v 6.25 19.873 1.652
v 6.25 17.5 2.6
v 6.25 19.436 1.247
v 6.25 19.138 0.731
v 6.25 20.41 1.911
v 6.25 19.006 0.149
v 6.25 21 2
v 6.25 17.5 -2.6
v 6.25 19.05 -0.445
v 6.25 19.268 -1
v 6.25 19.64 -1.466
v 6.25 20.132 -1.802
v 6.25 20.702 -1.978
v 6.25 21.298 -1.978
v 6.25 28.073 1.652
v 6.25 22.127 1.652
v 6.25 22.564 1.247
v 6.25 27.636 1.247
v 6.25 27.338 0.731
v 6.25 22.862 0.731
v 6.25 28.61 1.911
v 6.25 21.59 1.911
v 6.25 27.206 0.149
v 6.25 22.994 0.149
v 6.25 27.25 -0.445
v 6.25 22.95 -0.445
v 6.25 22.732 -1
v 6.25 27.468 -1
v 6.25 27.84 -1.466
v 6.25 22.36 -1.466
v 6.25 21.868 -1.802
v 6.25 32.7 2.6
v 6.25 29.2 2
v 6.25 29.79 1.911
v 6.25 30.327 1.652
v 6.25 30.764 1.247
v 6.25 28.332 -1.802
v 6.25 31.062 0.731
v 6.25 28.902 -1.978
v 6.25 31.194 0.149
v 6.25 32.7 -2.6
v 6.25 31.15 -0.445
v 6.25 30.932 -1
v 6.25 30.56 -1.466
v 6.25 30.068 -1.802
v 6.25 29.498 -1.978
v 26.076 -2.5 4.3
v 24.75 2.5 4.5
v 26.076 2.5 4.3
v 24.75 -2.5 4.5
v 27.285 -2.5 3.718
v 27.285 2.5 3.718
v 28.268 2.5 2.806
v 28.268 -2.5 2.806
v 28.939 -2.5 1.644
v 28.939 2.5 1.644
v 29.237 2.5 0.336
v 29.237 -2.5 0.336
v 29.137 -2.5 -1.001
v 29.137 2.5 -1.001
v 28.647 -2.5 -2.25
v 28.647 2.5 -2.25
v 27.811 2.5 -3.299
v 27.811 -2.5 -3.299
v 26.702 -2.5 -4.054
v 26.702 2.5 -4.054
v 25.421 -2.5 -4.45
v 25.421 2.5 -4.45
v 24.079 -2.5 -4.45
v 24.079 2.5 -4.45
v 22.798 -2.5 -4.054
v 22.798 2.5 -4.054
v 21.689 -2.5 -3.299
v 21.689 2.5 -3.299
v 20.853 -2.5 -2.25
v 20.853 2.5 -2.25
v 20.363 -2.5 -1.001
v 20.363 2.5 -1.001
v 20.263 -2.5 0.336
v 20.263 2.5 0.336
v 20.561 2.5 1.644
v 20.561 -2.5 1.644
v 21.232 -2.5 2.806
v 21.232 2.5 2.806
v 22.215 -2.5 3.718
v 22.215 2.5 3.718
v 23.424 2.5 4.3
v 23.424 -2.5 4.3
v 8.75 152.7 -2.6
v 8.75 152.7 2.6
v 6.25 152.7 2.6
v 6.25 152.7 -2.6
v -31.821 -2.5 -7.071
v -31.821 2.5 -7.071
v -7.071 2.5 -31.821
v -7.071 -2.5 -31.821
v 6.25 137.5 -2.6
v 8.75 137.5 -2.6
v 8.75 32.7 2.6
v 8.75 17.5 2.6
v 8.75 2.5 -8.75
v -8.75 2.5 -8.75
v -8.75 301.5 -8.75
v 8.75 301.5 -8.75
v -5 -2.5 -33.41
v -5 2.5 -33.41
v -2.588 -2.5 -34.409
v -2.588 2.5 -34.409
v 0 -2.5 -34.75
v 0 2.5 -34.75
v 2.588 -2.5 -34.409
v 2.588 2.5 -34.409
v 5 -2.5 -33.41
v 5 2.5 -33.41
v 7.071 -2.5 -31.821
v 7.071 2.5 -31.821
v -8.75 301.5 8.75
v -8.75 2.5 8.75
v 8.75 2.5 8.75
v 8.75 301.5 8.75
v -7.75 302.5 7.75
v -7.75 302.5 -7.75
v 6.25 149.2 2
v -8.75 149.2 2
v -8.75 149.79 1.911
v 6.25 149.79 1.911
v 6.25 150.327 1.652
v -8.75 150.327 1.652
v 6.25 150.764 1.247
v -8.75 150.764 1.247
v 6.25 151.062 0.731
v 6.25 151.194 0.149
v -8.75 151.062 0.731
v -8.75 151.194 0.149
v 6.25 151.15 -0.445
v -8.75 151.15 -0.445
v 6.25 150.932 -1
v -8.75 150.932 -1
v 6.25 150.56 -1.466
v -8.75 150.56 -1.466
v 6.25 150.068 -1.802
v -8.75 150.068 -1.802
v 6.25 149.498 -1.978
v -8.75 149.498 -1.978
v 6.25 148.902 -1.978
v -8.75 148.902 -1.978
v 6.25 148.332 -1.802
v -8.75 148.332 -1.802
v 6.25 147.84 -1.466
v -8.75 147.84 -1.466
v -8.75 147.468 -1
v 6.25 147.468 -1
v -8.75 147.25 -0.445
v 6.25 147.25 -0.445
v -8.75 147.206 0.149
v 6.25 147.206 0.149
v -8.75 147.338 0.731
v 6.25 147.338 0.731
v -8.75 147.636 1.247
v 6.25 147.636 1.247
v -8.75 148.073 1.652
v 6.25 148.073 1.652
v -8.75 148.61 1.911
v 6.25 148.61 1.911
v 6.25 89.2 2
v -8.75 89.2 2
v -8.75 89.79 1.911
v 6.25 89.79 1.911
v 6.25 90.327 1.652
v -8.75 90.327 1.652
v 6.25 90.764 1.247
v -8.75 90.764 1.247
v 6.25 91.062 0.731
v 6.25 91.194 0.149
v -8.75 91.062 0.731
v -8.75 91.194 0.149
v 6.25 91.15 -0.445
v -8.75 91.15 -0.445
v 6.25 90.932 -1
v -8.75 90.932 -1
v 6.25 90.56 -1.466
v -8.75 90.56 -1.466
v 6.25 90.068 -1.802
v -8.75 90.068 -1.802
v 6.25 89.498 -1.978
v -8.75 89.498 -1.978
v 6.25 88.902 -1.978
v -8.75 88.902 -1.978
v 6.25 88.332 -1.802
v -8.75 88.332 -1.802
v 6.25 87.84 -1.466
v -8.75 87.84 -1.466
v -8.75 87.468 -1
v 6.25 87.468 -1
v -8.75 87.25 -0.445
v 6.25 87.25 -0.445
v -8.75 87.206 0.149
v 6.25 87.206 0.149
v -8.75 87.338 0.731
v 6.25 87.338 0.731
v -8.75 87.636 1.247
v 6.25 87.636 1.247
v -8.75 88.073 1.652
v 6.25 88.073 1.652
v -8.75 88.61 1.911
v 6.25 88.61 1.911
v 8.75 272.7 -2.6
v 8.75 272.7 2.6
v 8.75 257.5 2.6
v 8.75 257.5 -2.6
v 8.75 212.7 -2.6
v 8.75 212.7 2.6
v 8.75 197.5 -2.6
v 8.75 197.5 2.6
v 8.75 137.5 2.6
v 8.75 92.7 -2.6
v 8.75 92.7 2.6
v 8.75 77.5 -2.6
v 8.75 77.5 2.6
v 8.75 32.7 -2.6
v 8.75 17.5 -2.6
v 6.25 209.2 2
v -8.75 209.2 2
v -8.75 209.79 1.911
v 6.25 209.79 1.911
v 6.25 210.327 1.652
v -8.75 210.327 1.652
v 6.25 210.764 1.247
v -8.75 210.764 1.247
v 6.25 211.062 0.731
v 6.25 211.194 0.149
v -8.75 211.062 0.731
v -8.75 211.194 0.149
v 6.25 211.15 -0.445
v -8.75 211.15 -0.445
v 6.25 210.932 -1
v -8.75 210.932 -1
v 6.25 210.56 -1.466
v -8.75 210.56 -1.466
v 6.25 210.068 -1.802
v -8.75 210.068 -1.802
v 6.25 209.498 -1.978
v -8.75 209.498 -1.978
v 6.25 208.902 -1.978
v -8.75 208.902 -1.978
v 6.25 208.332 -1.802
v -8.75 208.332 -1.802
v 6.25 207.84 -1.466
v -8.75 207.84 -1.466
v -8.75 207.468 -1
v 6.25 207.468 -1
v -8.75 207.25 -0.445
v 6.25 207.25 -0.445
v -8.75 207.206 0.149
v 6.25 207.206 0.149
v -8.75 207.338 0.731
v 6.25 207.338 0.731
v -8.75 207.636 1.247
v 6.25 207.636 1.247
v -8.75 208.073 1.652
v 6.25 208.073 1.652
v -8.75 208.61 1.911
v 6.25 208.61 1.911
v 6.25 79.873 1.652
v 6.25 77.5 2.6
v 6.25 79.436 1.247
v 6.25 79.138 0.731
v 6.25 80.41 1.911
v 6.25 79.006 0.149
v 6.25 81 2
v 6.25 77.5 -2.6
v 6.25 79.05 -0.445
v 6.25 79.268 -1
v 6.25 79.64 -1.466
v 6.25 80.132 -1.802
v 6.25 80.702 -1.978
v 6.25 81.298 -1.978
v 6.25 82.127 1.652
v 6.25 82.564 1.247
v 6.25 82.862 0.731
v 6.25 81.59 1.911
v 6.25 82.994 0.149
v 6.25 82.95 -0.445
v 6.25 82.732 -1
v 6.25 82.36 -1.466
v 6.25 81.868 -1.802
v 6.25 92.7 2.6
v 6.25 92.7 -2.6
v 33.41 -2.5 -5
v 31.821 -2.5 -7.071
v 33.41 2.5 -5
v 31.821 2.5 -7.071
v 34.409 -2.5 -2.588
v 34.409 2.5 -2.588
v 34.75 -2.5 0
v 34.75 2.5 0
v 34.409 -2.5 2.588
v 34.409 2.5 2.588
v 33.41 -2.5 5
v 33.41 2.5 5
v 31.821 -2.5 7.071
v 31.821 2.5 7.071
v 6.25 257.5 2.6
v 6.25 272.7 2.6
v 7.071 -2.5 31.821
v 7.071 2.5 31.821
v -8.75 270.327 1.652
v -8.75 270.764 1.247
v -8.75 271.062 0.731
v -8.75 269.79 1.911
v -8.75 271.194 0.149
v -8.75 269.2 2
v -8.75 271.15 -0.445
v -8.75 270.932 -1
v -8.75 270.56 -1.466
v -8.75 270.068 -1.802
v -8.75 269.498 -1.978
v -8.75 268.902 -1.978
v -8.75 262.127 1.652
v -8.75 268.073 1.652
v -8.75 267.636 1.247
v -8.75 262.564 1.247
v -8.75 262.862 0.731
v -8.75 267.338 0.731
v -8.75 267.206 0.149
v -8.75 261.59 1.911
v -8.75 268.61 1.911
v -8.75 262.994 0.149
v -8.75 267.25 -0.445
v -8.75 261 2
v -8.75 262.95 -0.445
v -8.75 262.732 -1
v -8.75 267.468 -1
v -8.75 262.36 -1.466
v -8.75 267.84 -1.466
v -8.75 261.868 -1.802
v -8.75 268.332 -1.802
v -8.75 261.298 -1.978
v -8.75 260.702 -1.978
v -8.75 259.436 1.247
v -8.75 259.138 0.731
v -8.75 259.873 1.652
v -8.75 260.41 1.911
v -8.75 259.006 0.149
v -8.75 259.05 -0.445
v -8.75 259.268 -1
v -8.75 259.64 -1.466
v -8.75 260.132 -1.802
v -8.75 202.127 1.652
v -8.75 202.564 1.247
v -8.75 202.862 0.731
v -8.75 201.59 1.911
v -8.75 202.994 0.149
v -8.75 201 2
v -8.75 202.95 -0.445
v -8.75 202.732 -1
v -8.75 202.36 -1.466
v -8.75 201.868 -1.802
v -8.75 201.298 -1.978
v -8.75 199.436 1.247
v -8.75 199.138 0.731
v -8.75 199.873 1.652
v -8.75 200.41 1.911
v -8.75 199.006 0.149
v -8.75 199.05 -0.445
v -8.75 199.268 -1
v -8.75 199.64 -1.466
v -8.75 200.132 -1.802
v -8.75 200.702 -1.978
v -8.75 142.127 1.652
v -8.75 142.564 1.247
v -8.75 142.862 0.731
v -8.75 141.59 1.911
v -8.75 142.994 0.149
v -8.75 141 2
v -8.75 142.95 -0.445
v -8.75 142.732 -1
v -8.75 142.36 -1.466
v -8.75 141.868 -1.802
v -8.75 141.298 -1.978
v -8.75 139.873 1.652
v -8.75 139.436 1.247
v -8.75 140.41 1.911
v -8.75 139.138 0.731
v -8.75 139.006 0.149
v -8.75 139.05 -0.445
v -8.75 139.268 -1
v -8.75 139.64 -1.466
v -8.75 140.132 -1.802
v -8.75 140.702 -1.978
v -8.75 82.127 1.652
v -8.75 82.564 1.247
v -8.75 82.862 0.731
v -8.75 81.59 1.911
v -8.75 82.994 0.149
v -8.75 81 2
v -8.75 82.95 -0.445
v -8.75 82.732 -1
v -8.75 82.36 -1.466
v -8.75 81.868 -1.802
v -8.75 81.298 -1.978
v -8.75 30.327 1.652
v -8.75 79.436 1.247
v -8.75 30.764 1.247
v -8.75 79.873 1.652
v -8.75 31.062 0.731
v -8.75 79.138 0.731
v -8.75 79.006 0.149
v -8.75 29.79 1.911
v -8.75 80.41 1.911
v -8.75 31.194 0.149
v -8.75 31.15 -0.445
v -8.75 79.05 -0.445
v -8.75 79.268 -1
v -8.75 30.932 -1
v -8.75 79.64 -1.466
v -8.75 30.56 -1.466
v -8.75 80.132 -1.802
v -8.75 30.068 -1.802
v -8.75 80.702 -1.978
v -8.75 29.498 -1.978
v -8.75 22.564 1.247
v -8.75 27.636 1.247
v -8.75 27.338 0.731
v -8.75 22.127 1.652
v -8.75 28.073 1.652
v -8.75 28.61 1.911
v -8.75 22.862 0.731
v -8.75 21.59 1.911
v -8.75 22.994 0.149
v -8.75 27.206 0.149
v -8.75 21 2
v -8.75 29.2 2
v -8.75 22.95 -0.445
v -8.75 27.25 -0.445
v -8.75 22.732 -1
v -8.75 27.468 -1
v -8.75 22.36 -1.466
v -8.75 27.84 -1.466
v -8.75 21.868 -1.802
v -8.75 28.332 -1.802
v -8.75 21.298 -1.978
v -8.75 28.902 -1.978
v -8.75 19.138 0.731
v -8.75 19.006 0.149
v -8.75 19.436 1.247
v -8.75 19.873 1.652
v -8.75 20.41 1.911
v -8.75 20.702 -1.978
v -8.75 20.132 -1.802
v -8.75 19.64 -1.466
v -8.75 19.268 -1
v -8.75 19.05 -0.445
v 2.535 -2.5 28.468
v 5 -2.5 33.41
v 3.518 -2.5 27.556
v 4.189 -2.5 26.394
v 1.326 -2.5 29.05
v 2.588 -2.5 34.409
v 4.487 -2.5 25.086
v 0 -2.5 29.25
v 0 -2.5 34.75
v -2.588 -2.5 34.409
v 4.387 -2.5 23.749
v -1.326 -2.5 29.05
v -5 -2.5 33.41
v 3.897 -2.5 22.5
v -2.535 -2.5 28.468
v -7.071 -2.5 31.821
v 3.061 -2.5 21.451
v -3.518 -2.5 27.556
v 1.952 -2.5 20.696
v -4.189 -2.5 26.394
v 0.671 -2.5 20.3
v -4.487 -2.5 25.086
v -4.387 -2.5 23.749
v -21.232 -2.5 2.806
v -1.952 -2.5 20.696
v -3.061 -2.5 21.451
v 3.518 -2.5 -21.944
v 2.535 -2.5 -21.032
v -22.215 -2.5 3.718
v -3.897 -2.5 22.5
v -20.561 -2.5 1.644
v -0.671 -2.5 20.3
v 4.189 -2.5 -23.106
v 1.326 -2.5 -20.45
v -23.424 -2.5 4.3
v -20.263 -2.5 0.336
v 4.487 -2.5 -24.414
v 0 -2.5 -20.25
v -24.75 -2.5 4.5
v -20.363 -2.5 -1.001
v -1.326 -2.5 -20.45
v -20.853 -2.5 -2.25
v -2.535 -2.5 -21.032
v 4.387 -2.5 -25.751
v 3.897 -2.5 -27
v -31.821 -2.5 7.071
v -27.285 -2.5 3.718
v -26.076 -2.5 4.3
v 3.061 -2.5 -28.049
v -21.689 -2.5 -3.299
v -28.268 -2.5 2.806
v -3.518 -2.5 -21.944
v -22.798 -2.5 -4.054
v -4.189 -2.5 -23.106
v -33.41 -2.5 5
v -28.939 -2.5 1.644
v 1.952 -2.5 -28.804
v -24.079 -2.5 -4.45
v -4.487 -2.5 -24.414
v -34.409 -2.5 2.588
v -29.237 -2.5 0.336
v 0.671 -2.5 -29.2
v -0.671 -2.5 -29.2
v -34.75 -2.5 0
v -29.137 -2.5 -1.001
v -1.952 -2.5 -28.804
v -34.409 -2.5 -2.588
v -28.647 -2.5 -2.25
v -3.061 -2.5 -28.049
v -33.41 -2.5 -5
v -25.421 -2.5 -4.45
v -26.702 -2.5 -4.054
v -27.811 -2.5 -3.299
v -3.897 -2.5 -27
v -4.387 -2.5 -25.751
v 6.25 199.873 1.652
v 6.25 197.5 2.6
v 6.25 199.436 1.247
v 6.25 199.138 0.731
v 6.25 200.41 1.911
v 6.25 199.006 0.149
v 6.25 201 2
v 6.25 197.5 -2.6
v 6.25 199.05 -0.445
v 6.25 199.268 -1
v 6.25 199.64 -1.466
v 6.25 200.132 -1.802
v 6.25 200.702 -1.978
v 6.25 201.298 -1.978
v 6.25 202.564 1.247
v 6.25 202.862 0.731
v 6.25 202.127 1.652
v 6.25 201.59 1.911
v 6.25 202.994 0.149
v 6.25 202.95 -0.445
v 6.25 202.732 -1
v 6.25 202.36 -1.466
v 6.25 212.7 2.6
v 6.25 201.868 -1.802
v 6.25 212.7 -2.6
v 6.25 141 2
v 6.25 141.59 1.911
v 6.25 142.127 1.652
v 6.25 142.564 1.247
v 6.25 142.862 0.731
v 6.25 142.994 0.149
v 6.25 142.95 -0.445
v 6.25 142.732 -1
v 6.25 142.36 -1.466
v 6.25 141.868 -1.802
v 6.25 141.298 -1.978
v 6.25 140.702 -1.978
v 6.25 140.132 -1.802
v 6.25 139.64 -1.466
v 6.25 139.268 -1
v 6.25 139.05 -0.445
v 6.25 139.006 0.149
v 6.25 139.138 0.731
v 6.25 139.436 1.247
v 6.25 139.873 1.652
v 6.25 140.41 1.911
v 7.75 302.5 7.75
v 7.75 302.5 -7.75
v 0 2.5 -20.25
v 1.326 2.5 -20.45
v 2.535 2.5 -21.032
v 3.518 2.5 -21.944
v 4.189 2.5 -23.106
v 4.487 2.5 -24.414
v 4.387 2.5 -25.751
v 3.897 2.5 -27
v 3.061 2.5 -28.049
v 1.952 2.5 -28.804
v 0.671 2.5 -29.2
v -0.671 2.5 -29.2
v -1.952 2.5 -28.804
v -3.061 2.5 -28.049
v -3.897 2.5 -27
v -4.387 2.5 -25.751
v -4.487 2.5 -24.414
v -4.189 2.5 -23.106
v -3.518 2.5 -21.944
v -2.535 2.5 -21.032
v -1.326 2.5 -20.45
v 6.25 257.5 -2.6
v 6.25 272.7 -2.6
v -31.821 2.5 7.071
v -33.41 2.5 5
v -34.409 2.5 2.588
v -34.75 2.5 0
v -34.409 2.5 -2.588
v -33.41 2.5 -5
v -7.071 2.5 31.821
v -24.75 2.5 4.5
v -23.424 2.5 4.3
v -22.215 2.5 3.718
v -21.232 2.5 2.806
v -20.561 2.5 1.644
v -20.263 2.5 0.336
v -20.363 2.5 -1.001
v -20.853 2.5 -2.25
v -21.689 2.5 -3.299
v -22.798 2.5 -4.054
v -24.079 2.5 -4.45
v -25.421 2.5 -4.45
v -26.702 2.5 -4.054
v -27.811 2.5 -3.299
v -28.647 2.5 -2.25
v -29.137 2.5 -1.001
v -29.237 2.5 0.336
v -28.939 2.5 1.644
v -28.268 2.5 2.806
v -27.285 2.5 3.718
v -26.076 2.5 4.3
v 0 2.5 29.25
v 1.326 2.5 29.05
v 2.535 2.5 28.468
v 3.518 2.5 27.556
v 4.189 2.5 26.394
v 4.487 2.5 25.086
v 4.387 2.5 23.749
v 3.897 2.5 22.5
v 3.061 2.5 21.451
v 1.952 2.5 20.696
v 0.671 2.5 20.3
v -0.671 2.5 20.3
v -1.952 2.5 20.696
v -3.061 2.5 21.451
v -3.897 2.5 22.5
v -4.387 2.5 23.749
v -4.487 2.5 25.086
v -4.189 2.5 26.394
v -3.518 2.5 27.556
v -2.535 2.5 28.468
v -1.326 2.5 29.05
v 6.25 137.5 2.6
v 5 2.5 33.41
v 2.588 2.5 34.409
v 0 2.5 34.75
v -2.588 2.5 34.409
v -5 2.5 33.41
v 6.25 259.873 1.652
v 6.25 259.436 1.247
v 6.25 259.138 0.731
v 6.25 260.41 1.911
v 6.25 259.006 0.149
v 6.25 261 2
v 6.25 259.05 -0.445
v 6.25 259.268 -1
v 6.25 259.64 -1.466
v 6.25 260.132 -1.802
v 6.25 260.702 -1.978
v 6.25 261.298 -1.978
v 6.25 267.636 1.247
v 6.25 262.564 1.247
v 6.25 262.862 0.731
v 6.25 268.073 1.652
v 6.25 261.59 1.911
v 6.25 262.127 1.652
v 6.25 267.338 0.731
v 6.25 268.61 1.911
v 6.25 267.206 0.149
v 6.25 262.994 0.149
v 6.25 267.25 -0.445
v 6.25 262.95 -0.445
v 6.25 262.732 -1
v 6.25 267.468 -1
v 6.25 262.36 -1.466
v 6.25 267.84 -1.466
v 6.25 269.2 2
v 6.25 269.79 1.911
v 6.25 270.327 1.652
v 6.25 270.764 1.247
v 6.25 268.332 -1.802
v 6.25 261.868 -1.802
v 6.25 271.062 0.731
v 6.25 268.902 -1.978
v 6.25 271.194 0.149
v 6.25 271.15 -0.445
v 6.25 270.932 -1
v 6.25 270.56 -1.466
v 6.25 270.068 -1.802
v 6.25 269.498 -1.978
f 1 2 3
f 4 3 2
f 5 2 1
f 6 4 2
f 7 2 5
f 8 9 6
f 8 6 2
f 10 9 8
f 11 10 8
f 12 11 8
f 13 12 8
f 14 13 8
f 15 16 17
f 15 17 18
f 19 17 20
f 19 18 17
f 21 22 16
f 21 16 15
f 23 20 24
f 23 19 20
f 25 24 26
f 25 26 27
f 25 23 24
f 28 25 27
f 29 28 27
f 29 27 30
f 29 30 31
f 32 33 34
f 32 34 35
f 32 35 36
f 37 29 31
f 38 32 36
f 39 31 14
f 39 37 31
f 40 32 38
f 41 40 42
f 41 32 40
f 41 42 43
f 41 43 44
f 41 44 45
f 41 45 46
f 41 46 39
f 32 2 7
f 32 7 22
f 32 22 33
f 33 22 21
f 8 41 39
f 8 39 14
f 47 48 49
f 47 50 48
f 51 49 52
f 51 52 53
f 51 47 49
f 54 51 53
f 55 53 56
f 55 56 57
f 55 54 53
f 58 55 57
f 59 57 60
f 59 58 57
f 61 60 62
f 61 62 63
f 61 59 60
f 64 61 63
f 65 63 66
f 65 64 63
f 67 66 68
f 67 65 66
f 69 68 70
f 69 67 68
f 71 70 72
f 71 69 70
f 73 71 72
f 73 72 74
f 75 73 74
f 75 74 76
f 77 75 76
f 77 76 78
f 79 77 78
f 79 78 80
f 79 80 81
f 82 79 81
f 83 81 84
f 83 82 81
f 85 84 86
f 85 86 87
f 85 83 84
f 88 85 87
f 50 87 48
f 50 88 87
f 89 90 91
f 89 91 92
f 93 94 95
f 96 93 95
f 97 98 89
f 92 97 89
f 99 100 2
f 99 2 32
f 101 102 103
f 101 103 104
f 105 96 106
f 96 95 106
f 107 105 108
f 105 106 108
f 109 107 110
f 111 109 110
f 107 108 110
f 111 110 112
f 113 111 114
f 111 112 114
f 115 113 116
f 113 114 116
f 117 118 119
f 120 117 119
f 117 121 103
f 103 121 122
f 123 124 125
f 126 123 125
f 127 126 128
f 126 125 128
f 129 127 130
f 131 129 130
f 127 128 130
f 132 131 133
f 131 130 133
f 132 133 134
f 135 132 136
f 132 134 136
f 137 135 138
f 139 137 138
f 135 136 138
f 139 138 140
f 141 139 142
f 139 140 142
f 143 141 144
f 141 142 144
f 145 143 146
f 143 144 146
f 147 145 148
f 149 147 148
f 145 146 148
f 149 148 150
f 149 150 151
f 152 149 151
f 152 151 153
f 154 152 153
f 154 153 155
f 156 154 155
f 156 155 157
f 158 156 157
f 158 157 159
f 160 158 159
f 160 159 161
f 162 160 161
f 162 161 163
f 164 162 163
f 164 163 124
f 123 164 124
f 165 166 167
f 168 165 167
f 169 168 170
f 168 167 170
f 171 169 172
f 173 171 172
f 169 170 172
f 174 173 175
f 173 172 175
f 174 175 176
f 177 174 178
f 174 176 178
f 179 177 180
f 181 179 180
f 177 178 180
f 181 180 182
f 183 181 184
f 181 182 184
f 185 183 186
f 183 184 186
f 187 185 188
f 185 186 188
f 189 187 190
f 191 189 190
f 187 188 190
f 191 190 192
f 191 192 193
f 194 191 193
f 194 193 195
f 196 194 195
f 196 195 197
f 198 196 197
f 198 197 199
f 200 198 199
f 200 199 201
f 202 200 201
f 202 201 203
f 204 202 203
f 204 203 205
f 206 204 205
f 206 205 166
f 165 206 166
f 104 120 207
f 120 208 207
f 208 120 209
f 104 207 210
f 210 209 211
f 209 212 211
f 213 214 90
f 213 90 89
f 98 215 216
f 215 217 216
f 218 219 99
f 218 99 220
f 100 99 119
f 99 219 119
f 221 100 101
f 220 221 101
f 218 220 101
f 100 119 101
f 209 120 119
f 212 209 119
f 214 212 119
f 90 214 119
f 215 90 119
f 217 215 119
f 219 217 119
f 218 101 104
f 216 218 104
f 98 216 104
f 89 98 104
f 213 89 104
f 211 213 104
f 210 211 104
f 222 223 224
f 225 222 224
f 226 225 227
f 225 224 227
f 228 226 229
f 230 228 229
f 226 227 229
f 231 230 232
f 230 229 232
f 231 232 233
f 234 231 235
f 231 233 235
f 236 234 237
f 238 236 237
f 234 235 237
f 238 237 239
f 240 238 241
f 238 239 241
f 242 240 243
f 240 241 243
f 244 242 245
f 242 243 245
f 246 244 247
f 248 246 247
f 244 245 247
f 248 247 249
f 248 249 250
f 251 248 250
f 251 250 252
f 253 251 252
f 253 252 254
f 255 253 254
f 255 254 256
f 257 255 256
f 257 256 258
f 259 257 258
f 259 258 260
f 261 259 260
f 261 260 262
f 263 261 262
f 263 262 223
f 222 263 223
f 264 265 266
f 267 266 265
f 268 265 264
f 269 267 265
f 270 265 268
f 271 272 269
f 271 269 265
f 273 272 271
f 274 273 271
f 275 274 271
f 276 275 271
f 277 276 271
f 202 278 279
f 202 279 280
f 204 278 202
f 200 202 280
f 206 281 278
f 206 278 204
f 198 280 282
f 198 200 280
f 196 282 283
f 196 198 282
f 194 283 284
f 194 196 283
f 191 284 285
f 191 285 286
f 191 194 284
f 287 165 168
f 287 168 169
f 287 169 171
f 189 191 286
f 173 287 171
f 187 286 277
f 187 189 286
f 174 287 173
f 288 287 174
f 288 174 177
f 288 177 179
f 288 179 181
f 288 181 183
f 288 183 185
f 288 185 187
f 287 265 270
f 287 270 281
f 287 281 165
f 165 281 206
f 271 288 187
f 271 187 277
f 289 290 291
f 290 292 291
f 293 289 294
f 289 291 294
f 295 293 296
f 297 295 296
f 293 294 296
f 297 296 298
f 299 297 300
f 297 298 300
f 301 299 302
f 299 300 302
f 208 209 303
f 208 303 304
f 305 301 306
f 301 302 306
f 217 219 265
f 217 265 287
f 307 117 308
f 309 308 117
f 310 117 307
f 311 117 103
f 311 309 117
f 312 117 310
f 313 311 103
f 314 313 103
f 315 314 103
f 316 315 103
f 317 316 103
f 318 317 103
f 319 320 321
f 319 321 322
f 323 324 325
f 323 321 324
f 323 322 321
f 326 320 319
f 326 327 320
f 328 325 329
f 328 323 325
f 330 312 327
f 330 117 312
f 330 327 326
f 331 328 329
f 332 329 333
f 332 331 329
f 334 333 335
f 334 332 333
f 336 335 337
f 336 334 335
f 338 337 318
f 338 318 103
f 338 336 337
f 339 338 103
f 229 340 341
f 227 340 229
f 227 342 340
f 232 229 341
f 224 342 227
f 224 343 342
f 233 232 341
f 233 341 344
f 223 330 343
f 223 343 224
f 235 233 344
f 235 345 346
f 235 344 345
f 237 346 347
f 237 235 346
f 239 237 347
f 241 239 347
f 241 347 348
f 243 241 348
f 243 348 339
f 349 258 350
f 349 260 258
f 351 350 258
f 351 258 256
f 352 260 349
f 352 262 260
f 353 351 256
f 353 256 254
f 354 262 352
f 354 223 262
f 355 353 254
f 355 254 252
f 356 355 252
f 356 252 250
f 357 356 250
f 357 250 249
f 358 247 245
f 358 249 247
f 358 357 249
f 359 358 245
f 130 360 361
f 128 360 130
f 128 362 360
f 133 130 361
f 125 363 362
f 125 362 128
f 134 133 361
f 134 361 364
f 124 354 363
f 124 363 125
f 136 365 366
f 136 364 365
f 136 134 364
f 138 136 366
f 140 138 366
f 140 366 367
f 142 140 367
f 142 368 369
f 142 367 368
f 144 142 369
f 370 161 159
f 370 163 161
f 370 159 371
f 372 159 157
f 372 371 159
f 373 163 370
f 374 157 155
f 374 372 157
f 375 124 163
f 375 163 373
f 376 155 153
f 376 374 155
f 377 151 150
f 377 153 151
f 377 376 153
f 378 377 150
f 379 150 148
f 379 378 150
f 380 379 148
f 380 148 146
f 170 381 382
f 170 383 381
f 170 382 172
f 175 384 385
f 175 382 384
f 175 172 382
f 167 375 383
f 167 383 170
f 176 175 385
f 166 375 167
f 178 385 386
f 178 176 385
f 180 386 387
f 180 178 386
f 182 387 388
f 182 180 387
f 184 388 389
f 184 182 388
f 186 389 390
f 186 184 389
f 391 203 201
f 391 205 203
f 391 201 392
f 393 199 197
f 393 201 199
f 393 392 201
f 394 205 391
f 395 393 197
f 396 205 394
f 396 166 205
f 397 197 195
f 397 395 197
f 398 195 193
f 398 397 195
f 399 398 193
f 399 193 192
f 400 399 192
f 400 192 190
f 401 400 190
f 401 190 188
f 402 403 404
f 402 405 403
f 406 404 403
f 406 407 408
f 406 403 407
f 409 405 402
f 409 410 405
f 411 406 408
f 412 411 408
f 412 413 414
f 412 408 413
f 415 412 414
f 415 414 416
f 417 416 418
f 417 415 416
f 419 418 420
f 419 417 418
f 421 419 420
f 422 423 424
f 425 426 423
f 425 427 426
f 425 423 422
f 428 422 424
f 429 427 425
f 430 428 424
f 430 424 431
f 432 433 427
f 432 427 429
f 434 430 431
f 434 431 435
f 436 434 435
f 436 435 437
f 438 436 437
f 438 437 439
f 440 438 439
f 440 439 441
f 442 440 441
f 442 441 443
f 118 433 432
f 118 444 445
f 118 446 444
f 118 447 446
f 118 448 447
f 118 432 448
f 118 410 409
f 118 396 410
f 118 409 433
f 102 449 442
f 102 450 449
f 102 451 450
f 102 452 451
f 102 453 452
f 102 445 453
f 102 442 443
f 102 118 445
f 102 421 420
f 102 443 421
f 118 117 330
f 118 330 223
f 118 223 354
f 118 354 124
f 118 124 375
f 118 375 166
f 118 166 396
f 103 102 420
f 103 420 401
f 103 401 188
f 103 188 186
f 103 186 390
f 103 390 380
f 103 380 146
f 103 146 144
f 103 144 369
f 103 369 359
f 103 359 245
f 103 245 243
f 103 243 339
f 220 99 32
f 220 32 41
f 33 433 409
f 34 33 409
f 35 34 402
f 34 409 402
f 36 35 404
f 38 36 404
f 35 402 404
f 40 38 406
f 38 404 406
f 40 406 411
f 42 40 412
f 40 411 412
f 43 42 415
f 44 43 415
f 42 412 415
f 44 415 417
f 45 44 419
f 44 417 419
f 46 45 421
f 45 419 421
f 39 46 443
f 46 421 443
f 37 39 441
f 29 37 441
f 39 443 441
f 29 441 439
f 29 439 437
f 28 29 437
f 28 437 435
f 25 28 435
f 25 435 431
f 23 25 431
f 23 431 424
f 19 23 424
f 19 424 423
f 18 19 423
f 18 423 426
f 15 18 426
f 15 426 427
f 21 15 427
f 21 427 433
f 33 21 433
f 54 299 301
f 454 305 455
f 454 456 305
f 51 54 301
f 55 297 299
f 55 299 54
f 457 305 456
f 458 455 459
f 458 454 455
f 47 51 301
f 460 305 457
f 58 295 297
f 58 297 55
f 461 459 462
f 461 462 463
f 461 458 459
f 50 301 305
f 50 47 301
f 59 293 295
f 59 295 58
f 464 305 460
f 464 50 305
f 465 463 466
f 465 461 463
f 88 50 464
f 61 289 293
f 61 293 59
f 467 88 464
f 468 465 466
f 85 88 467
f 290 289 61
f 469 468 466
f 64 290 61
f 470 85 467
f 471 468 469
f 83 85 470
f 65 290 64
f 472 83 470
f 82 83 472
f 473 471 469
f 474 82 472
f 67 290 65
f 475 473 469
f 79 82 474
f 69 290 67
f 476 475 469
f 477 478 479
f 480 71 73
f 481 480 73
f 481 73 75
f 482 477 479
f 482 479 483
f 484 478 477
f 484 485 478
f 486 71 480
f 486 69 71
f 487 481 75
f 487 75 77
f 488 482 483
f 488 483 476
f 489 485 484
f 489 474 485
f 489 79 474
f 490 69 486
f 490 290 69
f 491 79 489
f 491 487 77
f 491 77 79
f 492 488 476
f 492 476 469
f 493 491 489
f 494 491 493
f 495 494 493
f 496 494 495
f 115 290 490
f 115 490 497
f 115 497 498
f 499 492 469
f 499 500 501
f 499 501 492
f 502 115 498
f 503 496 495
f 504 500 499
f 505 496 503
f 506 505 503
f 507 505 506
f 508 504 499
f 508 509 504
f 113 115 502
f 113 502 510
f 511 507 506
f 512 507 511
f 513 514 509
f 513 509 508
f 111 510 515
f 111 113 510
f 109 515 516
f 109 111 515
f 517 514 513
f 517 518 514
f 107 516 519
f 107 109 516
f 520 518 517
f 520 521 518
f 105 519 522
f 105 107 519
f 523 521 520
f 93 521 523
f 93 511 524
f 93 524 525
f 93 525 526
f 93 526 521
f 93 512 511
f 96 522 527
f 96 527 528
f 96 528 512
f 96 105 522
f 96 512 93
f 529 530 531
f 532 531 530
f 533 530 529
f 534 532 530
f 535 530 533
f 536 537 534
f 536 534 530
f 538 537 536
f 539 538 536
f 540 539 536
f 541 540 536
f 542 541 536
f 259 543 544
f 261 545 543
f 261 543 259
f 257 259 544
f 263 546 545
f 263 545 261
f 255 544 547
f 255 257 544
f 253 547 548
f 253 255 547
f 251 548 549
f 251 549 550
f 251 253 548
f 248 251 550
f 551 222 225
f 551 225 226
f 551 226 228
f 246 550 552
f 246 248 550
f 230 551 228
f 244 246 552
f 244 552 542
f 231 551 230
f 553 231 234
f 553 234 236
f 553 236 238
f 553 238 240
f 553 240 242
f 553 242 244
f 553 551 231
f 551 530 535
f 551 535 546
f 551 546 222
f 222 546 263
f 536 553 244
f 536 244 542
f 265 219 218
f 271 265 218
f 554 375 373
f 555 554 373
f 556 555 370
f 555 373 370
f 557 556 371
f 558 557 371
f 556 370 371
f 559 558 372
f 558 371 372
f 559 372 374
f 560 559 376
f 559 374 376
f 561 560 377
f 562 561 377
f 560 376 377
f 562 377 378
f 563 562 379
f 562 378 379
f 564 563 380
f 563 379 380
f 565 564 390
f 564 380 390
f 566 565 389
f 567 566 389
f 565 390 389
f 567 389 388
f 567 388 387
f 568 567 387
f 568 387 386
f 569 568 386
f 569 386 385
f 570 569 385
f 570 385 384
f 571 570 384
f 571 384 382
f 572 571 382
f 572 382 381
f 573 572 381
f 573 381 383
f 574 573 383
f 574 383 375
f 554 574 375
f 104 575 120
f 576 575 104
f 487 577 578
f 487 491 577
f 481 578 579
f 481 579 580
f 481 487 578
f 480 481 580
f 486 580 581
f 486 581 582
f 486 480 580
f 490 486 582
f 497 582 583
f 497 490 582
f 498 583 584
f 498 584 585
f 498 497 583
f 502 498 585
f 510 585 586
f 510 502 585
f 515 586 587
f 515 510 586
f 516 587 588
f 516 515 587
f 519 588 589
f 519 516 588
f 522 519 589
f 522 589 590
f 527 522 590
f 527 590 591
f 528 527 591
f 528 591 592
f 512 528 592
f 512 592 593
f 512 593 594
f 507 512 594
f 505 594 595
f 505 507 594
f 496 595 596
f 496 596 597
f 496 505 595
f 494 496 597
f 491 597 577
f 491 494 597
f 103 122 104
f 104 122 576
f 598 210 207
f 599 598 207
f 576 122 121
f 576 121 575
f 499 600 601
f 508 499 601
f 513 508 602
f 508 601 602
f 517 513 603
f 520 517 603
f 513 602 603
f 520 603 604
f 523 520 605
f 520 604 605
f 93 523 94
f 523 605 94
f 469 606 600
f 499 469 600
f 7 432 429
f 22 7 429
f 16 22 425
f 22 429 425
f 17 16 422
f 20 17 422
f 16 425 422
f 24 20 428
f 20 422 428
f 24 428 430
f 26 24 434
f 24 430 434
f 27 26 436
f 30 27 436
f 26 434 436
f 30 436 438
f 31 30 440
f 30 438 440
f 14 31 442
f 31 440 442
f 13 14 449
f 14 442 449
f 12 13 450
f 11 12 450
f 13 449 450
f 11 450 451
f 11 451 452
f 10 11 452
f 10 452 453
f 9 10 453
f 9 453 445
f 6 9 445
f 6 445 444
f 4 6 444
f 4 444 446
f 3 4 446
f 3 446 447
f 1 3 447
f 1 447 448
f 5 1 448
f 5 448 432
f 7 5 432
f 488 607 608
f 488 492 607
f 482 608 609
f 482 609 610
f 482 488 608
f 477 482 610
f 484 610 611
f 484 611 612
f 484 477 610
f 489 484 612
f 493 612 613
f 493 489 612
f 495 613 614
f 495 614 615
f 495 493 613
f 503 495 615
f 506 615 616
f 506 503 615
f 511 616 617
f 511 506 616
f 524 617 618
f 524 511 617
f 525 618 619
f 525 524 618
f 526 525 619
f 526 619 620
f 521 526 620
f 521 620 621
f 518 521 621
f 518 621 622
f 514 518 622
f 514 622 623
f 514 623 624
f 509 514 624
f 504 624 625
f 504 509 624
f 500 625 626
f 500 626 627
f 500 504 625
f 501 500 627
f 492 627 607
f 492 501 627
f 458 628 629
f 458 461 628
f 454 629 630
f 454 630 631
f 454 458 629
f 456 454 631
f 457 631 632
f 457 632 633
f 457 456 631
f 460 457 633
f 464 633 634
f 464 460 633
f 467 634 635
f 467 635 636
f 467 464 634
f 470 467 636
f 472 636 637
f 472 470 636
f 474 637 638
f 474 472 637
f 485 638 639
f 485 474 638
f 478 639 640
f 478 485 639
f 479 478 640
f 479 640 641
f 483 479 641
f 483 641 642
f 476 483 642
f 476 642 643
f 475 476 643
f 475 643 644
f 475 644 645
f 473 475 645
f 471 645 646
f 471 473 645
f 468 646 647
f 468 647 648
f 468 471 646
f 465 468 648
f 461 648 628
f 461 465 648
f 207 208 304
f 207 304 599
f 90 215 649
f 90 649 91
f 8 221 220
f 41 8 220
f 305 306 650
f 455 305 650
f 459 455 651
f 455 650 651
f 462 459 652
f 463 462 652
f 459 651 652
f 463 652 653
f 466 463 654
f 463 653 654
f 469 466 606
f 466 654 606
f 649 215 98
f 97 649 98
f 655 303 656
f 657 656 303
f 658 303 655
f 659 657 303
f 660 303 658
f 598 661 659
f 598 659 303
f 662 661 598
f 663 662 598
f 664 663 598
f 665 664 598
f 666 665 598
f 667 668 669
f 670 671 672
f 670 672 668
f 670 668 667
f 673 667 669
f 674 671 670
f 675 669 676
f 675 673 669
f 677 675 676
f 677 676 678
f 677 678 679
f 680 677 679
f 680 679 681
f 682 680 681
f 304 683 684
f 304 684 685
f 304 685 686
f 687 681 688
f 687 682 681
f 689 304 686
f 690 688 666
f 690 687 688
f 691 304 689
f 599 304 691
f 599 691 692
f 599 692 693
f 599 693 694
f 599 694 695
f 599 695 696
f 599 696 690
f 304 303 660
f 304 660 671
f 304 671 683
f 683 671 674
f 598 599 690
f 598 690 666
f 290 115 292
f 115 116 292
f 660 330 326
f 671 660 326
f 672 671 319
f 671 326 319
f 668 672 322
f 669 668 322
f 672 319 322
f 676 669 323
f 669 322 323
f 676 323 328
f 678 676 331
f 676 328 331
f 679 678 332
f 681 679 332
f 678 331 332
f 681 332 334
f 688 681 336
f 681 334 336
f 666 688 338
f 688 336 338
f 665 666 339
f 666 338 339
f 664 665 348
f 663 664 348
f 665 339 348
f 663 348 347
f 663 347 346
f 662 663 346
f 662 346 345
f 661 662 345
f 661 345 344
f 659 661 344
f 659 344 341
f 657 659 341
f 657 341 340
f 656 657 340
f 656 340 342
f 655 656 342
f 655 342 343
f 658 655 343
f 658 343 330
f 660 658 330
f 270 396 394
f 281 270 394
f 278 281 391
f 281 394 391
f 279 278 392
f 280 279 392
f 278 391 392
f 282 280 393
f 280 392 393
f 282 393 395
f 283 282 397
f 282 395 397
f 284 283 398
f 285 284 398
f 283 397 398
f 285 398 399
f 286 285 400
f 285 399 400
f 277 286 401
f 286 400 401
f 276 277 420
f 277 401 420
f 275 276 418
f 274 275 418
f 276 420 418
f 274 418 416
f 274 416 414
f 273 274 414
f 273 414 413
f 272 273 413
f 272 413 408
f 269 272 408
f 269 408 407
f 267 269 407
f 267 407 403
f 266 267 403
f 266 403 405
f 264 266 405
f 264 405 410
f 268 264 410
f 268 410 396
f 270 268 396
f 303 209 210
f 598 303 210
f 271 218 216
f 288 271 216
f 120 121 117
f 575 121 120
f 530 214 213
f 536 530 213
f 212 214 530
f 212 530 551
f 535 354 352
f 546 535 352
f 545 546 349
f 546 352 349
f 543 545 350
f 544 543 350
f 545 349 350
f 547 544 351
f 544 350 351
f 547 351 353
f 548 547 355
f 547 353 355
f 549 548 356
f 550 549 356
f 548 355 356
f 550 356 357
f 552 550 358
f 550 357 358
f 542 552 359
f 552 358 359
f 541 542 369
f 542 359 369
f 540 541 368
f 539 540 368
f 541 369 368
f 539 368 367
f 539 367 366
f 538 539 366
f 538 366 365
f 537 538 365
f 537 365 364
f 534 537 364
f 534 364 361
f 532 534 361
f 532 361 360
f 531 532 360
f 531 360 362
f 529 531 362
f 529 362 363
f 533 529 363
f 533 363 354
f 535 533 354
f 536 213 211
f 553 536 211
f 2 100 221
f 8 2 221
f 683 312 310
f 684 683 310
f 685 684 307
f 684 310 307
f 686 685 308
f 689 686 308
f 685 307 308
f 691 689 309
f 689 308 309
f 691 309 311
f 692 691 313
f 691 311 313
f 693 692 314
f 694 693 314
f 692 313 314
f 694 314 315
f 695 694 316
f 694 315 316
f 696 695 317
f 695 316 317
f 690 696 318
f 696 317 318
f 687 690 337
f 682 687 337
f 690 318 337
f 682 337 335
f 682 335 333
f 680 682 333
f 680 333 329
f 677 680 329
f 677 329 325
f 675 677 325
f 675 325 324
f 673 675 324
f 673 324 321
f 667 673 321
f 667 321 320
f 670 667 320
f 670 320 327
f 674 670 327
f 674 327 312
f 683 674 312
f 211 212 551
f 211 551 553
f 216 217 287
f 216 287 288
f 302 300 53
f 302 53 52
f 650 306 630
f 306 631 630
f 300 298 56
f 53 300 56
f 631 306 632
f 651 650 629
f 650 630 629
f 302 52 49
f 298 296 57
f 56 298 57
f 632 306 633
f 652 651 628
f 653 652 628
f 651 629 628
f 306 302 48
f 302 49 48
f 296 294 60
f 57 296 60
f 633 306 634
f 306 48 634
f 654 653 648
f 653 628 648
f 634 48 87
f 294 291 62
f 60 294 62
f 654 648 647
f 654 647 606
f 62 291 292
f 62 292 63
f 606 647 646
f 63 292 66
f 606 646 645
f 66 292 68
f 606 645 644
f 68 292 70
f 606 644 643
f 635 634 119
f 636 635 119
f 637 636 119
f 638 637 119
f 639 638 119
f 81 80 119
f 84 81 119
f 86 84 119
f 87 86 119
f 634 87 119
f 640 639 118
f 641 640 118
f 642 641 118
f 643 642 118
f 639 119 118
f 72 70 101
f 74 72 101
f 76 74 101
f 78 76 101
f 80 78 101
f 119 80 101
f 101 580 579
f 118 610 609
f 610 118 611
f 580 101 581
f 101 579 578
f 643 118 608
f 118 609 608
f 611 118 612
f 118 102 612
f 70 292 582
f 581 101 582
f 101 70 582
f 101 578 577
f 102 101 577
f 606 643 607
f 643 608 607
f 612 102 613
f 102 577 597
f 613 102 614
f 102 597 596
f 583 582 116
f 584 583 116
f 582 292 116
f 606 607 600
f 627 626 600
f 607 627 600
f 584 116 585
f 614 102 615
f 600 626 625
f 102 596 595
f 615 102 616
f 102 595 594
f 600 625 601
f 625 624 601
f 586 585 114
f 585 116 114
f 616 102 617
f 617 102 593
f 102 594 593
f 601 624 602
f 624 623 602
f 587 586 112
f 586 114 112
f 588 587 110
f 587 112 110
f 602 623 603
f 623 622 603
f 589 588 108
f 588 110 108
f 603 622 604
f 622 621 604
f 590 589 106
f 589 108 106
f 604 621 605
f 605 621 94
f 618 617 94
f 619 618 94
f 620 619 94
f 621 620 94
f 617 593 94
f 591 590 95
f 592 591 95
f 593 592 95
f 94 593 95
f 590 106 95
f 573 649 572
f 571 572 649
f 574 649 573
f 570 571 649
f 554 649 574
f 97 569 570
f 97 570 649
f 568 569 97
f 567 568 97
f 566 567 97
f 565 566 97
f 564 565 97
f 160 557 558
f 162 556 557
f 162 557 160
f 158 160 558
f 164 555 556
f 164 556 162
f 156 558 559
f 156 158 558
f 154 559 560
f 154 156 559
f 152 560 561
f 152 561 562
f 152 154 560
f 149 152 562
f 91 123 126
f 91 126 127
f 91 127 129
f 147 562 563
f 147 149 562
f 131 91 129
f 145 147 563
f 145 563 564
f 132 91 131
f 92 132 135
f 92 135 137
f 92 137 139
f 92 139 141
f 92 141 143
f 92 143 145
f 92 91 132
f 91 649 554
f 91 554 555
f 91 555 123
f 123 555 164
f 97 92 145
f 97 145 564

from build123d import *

# Parameters (mm, degrees)
SKETCH1_R             = 4.5
BOSS_EXTRUDE1_DEPTH   = 2.5
SKETCH2_W             = 17.5
SKETCH2_H             = 17.5
BOSS_EXTRUDE2_DEPTH   = 300
SKETCH3_W             = 5.2
SKETCH3_H             = 15.2
CUT_EXTRUDE1_DEPTH    = 2.5
F_4_0MM_DOWEL_HOLE1_D = 4
LPATTERN1_COUNT       = 5
LPATTERN1_PITCH       = 60
CHAMFER1_SIZE         = 1


with BuildPart() as part:
    # Sketch1 → Boss-Extrude1 (new, symmetric)
    with BuildSketch(Plane(origin=(0, 0, 0), x_dir=(1, 0, 0), z_dir=(0, 1, 0))):
        with BuildLine():
            Line((-31.821067812, 7.071067812), (-7.071067812, 31.821067812))
            ThreePointArc((-7.071067812, 31.821067812), (0, 34.75), (7.071067812, 31.821067812))
            Line((7.071067812, 31.821067812), (31.821067812, 7.071067812))
            ThreePointArc((31.821067812, 7.071067812), (34.75, 0), (31.821067812, -7.071067812))
            Line((31.821067812, -7.071067812), (7.071067812, -31.821067812))
            ThreePointArc((7.071067812, -31.821067812), (0, -34.75), (-7.071067812, -31.821067812))
            Line((-7.071067812, -31.821067812), (-31.821067812, -7.071067812))
            ThreePointArc((-31.821067812, -7.071067812), (-34.75, 0), (-31.821067812, 7.071067812))
        make_face()
        with Locations((0, 24.75)):
            Circle(SKETCH1_R, mode=Mode.SUBTRACT)
        with Locations((24.75, 0)):
            Circle(SKETCH1_R, mode=Mode.SUBTRACT)
        with Locations((0, -24.75)):
            Circle(SKETCH1_R, mode=Mode.SUBTRACT)
        with Locations((-24.75, 0)):
            Circle(SKETCH1_R, mode=Mode.SUBTRACT)
    extrude(amount=BOSS_EXTRUDE1_DEPTH, both=True)

    # Sketch2 → Boss-Extrude2 (add)
    with BuildSketch(Plane(origin=(0, 2.5, 0), x_dir=(1, 0, 0), z_dir=(0, 1, 0))):
        Rectangle(SKETCH2_W, SKETCH2_H)
    extrude(amount=BOSS_EXTRUDE2_DEPTH)

    # Sketch3 → Cut-Extrude1 (cut)
    with BuildSketch(Plane(origin=(8.75, 0, 0), x_dir=(0, 0, -1), z_dir=(1, 0, 0))):
        with Locations((0, 25.1)):
            Rectangle(SKETCH3_W, SKETCH3_H)
    cut_extrude1 = extrude(amount=-CUT_EXTRUDE1_DEPTH, mode=Mode.SUBTRACT)

    # Ø4.0mm Dowel Hole1 (through all)
    with Locations(Plane(origin=(6.25, 0, 0), x_dir=(0, 0, -1), z_dir=(1, 0, 0))):
        with Locations((0, 21), (0, 29.2)):
            f_4_0mm_dowel_hole1 = Hole(F_4_0MM_DOWEL_HOLE1_D / 2)

    # LPattern1: Cut-Extrude1, Ø4.0mm Dowel Hole1 ×5
    with Locations(*[(0, i * LPATTERN1_PITCH, 0) for i in range(1, LPATTERN1_COUNT)]):
        add(cut_extrude1, mode=Mode.SUBTRACT)
        add(f_4_0mm_dowel_hole1, mode=Mode.SUBTRACT)

    # Chamfer1
    chamfer1_edges = [part.edges().sort_by_distance(p)[0] for p in [
        (0, 302.5, -8.75),
        (8.75, 302.5, 0),
        (0, 302.5, 8.75),
        (-8.75, 302.5, 0),
    ]]
    chamfer(chamfer1_edges, length=CHAMFER1_SIZE)


solid = part.part
